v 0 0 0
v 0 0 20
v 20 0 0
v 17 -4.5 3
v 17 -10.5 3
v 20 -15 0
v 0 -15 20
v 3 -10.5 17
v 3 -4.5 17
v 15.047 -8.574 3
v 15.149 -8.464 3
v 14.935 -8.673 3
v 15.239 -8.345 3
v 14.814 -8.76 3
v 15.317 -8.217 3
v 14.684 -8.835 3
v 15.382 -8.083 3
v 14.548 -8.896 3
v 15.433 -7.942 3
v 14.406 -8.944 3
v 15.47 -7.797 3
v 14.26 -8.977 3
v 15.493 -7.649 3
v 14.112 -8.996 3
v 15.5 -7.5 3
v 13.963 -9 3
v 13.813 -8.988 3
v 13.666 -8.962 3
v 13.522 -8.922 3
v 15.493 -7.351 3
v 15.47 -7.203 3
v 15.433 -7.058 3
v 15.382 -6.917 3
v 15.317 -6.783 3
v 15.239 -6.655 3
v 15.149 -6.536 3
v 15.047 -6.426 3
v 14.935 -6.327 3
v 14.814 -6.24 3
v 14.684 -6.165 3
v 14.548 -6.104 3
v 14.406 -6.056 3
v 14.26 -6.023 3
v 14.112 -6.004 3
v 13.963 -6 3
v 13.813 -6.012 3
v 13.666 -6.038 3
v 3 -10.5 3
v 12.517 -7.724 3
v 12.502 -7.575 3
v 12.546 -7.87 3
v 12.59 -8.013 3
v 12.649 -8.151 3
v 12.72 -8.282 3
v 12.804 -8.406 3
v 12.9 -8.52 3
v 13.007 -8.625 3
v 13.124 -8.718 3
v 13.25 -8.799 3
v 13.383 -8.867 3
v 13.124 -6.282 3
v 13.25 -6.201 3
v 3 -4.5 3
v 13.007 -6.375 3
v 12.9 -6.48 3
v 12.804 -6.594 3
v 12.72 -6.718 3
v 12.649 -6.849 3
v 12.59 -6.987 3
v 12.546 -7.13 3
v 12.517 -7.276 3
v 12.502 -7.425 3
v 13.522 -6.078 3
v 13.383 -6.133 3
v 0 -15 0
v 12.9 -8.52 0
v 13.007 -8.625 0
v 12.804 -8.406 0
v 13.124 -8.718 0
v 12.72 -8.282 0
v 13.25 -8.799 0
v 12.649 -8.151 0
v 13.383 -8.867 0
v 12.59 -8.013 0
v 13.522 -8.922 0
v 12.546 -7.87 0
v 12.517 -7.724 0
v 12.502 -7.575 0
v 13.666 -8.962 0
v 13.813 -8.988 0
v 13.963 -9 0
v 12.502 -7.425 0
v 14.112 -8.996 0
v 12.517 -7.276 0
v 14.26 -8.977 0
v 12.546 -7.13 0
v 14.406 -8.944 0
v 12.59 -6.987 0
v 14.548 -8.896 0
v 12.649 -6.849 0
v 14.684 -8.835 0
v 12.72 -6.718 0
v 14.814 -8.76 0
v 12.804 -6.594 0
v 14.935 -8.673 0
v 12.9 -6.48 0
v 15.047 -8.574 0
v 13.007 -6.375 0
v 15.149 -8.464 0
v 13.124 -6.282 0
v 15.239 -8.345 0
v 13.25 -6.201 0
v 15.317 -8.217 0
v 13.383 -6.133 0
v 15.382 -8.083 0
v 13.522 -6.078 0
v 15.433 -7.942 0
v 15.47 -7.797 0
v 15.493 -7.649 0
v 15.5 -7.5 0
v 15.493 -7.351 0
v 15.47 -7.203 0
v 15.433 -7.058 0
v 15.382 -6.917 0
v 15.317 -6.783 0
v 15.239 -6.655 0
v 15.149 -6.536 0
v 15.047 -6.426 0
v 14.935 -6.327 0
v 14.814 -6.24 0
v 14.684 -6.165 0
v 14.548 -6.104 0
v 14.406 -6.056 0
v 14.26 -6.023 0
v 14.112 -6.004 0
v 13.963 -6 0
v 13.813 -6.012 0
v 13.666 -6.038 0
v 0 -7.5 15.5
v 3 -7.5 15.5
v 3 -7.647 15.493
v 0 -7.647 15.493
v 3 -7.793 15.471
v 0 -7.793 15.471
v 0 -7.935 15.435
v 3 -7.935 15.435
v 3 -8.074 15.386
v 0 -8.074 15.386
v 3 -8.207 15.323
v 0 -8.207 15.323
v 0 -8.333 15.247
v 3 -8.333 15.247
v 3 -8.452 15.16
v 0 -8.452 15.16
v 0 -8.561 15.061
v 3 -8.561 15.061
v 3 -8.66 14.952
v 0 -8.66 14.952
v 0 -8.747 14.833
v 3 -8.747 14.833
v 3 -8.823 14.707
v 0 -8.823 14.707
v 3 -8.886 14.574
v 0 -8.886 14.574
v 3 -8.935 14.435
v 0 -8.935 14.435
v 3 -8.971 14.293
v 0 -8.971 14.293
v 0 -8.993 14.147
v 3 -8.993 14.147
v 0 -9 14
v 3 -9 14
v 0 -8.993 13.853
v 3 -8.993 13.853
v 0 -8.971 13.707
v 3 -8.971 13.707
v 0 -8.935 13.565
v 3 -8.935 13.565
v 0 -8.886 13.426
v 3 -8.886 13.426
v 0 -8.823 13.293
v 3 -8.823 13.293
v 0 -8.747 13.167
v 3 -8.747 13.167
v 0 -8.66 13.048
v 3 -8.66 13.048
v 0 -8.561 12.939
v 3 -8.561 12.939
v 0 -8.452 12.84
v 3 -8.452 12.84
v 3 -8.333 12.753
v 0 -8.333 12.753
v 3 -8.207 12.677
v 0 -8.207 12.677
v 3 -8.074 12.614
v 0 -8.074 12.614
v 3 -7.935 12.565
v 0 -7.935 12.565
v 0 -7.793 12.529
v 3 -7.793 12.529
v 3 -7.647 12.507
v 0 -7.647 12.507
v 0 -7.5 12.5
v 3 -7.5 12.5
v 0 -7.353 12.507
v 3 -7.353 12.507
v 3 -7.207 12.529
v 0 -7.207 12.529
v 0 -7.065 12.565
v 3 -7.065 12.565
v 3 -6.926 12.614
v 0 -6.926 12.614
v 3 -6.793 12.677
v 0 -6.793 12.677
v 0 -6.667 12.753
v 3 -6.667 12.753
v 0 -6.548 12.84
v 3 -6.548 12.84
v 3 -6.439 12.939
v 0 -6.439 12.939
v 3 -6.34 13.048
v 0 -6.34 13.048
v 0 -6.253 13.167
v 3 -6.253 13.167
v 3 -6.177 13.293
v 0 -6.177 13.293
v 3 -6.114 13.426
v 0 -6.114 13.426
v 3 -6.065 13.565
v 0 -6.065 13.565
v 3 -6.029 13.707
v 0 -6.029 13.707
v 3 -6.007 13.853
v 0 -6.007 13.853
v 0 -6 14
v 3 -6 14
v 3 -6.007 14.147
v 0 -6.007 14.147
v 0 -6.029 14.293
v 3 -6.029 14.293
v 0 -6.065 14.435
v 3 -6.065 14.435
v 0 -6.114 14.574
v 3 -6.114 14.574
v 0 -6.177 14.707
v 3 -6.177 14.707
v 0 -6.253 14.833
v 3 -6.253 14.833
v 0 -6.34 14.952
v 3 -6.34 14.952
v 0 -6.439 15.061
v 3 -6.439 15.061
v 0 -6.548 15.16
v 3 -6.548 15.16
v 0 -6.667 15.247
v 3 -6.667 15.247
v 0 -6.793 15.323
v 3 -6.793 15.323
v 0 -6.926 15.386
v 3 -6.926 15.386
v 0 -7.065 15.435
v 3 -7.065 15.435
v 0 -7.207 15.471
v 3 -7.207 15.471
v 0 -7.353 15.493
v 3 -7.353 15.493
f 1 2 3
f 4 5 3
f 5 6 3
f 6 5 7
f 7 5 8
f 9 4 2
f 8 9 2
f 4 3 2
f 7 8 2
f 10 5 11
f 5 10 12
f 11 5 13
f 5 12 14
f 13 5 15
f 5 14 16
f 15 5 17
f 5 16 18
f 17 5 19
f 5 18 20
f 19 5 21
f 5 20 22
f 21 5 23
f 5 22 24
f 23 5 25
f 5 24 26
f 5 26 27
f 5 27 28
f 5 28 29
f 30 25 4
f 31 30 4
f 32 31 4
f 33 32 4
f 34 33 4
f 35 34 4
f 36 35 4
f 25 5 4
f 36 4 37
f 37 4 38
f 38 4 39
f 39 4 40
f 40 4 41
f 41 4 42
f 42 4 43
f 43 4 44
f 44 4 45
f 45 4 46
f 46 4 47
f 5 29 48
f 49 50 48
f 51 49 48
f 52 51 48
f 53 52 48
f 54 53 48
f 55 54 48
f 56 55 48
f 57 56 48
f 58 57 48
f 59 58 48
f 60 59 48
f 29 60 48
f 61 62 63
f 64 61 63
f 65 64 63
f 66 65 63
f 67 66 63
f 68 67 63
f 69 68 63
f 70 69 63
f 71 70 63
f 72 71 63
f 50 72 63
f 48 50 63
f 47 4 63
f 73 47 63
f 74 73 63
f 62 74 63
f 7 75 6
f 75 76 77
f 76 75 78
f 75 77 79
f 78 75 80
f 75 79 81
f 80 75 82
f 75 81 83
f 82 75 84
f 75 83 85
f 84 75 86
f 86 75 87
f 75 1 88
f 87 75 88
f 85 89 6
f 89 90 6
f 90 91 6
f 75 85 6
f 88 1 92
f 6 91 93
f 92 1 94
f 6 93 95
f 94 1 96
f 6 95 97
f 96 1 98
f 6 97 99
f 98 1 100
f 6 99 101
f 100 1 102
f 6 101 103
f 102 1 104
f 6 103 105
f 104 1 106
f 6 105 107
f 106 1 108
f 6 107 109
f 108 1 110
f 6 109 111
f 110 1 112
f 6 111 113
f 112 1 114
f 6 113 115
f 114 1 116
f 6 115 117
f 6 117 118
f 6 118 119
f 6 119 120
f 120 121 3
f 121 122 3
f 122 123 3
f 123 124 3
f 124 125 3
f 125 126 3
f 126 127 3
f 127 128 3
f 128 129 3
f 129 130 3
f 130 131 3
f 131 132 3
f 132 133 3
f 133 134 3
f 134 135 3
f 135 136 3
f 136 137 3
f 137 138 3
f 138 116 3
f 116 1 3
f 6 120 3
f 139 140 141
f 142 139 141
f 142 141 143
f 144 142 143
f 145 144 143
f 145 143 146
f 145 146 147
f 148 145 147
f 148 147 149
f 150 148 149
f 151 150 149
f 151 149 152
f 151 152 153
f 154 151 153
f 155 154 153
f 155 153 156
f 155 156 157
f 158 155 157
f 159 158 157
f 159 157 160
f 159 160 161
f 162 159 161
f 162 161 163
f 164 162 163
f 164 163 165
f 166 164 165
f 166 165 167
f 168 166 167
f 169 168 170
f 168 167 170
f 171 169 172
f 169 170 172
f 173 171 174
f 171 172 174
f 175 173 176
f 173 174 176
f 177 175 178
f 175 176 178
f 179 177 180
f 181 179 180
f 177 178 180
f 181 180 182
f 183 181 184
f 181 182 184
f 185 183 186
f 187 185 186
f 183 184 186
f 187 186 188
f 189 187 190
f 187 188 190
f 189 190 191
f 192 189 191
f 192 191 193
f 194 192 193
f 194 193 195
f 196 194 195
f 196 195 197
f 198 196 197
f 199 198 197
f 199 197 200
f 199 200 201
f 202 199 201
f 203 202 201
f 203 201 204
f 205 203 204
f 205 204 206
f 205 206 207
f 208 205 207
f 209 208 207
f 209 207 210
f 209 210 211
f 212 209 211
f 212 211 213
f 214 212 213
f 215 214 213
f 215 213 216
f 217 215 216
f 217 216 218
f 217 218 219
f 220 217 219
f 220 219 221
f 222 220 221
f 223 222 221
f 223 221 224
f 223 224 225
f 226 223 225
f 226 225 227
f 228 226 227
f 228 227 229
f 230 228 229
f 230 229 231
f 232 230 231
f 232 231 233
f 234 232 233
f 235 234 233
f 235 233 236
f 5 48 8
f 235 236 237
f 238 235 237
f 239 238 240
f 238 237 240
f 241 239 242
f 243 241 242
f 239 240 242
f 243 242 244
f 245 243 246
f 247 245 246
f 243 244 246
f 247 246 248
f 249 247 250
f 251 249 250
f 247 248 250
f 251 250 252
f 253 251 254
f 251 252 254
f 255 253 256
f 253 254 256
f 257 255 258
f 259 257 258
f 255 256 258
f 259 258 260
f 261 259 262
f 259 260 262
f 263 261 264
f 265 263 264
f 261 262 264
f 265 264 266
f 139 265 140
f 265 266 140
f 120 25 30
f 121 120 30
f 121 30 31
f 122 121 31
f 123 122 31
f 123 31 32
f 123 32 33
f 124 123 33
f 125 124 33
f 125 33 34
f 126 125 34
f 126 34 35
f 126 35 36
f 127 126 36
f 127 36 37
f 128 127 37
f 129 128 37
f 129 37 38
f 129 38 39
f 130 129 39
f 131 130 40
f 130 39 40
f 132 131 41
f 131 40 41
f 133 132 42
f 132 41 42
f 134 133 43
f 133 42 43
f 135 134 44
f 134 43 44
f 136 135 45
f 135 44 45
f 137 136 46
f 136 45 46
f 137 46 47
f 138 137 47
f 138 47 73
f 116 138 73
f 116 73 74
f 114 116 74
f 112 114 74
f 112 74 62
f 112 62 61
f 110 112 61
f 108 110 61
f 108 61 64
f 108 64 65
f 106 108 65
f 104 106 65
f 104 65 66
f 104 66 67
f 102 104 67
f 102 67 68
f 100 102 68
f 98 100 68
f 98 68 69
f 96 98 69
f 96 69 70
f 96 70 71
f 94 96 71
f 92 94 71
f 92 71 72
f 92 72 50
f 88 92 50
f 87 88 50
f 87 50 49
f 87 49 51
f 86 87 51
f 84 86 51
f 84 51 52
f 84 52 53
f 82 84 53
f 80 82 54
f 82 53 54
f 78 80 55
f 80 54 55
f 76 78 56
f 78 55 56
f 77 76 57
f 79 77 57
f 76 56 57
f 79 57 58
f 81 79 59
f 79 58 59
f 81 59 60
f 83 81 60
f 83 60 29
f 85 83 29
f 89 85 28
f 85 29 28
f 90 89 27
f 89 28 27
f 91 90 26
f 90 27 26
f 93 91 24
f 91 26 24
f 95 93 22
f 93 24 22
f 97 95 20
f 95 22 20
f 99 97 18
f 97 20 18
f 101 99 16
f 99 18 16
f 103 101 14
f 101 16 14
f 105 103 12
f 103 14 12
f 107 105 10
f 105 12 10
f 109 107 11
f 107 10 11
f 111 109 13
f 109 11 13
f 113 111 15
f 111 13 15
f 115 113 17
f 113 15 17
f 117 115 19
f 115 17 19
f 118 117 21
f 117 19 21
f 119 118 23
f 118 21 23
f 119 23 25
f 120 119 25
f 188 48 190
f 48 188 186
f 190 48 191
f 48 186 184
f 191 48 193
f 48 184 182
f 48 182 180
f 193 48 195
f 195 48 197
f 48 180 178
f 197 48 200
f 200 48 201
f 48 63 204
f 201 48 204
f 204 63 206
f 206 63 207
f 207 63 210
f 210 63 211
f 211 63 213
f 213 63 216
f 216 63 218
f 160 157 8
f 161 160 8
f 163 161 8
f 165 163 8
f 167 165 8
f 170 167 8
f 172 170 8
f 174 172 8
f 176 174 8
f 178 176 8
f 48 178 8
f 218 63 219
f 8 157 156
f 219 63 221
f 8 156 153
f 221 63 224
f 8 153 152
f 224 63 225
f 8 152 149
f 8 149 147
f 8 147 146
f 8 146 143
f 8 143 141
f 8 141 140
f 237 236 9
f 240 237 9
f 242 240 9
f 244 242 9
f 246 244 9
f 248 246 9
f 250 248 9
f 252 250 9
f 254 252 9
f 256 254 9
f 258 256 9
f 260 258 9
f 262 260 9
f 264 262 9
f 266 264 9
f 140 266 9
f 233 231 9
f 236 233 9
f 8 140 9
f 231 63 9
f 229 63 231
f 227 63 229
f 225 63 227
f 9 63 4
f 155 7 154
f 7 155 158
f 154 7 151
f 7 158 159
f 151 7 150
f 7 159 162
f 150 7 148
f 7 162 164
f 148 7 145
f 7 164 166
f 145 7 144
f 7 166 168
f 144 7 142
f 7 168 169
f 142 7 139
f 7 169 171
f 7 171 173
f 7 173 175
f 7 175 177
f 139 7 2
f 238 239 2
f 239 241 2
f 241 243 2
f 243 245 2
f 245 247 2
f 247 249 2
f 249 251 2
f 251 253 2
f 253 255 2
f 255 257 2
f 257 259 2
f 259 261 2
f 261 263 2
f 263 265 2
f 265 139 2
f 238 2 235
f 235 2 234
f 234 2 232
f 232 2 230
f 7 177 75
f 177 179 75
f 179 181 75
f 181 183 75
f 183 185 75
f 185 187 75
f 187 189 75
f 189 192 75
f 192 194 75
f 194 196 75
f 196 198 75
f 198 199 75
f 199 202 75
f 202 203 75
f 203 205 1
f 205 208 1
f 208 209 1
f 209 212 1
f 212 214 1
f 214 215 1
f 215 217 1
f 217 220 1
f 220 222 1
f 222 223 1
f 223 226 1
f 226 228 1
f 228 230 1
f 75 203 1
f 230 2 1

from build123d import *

# Parameters (mm, degrees)
F1_DEPTH = 4.5
F3_DEPTH = 6
F5_DEPTH = 4.5
F7_DEPTH = 3.001
F8_R     = 1.5
F9_DEPTH = 25


with BuildPart() as f1:
    # F0 (on Front) → F1 (new body)
    with BuildSketch(Plane.XZ):
        Polygon((0, 20), (0, 0), (20, 0), align=None)
    extrude(amount=F1_DEPTH)

    # F2 (on face) → F3 (join)
    with BuildSketch(Plane.XZ.offset(4.5)):
        Polygon((15, 3), (3, 3), (3, 15), (3, 17), (0, 20), (0, 0), (20, 0), (17, 3), align=None)
    extrude(amount=F3_DEPTH)

    # F4 (on face) → F5 (join)
    with BuildSketch(Plane.XZ.offset(10.5)):
        Polygon((20, 0), (0, 20), (0, 0), align=None)
    extrude(amount=F5_DEPTH)

    # F6 (on face) → F7 (cut, through all)
    with BuildSketch(Plane.YZ.offset(3)):
        with BuildLine():
            ThreePointArc((-7.5, 15.5), (-8.56066, 12.93934), (-6, 14))
            ThreePointArc((-6, 14), (-6.43934, 15.06066), (-7.5, 15.5))
        make_face()
    extrude(amount=-F7_DEPTH, mode=Mode.SUBTRACT)

    # F8 (on face) → F9 (cut)
    with BuildSketch(Plane.XY.offset(3)):
        with Locations((14, -7.5)):
            Circle(F8_R)
    extrude(amount=-F9_DEPTH, mode=Mode.SUBTRACT)


solid = f1.part
